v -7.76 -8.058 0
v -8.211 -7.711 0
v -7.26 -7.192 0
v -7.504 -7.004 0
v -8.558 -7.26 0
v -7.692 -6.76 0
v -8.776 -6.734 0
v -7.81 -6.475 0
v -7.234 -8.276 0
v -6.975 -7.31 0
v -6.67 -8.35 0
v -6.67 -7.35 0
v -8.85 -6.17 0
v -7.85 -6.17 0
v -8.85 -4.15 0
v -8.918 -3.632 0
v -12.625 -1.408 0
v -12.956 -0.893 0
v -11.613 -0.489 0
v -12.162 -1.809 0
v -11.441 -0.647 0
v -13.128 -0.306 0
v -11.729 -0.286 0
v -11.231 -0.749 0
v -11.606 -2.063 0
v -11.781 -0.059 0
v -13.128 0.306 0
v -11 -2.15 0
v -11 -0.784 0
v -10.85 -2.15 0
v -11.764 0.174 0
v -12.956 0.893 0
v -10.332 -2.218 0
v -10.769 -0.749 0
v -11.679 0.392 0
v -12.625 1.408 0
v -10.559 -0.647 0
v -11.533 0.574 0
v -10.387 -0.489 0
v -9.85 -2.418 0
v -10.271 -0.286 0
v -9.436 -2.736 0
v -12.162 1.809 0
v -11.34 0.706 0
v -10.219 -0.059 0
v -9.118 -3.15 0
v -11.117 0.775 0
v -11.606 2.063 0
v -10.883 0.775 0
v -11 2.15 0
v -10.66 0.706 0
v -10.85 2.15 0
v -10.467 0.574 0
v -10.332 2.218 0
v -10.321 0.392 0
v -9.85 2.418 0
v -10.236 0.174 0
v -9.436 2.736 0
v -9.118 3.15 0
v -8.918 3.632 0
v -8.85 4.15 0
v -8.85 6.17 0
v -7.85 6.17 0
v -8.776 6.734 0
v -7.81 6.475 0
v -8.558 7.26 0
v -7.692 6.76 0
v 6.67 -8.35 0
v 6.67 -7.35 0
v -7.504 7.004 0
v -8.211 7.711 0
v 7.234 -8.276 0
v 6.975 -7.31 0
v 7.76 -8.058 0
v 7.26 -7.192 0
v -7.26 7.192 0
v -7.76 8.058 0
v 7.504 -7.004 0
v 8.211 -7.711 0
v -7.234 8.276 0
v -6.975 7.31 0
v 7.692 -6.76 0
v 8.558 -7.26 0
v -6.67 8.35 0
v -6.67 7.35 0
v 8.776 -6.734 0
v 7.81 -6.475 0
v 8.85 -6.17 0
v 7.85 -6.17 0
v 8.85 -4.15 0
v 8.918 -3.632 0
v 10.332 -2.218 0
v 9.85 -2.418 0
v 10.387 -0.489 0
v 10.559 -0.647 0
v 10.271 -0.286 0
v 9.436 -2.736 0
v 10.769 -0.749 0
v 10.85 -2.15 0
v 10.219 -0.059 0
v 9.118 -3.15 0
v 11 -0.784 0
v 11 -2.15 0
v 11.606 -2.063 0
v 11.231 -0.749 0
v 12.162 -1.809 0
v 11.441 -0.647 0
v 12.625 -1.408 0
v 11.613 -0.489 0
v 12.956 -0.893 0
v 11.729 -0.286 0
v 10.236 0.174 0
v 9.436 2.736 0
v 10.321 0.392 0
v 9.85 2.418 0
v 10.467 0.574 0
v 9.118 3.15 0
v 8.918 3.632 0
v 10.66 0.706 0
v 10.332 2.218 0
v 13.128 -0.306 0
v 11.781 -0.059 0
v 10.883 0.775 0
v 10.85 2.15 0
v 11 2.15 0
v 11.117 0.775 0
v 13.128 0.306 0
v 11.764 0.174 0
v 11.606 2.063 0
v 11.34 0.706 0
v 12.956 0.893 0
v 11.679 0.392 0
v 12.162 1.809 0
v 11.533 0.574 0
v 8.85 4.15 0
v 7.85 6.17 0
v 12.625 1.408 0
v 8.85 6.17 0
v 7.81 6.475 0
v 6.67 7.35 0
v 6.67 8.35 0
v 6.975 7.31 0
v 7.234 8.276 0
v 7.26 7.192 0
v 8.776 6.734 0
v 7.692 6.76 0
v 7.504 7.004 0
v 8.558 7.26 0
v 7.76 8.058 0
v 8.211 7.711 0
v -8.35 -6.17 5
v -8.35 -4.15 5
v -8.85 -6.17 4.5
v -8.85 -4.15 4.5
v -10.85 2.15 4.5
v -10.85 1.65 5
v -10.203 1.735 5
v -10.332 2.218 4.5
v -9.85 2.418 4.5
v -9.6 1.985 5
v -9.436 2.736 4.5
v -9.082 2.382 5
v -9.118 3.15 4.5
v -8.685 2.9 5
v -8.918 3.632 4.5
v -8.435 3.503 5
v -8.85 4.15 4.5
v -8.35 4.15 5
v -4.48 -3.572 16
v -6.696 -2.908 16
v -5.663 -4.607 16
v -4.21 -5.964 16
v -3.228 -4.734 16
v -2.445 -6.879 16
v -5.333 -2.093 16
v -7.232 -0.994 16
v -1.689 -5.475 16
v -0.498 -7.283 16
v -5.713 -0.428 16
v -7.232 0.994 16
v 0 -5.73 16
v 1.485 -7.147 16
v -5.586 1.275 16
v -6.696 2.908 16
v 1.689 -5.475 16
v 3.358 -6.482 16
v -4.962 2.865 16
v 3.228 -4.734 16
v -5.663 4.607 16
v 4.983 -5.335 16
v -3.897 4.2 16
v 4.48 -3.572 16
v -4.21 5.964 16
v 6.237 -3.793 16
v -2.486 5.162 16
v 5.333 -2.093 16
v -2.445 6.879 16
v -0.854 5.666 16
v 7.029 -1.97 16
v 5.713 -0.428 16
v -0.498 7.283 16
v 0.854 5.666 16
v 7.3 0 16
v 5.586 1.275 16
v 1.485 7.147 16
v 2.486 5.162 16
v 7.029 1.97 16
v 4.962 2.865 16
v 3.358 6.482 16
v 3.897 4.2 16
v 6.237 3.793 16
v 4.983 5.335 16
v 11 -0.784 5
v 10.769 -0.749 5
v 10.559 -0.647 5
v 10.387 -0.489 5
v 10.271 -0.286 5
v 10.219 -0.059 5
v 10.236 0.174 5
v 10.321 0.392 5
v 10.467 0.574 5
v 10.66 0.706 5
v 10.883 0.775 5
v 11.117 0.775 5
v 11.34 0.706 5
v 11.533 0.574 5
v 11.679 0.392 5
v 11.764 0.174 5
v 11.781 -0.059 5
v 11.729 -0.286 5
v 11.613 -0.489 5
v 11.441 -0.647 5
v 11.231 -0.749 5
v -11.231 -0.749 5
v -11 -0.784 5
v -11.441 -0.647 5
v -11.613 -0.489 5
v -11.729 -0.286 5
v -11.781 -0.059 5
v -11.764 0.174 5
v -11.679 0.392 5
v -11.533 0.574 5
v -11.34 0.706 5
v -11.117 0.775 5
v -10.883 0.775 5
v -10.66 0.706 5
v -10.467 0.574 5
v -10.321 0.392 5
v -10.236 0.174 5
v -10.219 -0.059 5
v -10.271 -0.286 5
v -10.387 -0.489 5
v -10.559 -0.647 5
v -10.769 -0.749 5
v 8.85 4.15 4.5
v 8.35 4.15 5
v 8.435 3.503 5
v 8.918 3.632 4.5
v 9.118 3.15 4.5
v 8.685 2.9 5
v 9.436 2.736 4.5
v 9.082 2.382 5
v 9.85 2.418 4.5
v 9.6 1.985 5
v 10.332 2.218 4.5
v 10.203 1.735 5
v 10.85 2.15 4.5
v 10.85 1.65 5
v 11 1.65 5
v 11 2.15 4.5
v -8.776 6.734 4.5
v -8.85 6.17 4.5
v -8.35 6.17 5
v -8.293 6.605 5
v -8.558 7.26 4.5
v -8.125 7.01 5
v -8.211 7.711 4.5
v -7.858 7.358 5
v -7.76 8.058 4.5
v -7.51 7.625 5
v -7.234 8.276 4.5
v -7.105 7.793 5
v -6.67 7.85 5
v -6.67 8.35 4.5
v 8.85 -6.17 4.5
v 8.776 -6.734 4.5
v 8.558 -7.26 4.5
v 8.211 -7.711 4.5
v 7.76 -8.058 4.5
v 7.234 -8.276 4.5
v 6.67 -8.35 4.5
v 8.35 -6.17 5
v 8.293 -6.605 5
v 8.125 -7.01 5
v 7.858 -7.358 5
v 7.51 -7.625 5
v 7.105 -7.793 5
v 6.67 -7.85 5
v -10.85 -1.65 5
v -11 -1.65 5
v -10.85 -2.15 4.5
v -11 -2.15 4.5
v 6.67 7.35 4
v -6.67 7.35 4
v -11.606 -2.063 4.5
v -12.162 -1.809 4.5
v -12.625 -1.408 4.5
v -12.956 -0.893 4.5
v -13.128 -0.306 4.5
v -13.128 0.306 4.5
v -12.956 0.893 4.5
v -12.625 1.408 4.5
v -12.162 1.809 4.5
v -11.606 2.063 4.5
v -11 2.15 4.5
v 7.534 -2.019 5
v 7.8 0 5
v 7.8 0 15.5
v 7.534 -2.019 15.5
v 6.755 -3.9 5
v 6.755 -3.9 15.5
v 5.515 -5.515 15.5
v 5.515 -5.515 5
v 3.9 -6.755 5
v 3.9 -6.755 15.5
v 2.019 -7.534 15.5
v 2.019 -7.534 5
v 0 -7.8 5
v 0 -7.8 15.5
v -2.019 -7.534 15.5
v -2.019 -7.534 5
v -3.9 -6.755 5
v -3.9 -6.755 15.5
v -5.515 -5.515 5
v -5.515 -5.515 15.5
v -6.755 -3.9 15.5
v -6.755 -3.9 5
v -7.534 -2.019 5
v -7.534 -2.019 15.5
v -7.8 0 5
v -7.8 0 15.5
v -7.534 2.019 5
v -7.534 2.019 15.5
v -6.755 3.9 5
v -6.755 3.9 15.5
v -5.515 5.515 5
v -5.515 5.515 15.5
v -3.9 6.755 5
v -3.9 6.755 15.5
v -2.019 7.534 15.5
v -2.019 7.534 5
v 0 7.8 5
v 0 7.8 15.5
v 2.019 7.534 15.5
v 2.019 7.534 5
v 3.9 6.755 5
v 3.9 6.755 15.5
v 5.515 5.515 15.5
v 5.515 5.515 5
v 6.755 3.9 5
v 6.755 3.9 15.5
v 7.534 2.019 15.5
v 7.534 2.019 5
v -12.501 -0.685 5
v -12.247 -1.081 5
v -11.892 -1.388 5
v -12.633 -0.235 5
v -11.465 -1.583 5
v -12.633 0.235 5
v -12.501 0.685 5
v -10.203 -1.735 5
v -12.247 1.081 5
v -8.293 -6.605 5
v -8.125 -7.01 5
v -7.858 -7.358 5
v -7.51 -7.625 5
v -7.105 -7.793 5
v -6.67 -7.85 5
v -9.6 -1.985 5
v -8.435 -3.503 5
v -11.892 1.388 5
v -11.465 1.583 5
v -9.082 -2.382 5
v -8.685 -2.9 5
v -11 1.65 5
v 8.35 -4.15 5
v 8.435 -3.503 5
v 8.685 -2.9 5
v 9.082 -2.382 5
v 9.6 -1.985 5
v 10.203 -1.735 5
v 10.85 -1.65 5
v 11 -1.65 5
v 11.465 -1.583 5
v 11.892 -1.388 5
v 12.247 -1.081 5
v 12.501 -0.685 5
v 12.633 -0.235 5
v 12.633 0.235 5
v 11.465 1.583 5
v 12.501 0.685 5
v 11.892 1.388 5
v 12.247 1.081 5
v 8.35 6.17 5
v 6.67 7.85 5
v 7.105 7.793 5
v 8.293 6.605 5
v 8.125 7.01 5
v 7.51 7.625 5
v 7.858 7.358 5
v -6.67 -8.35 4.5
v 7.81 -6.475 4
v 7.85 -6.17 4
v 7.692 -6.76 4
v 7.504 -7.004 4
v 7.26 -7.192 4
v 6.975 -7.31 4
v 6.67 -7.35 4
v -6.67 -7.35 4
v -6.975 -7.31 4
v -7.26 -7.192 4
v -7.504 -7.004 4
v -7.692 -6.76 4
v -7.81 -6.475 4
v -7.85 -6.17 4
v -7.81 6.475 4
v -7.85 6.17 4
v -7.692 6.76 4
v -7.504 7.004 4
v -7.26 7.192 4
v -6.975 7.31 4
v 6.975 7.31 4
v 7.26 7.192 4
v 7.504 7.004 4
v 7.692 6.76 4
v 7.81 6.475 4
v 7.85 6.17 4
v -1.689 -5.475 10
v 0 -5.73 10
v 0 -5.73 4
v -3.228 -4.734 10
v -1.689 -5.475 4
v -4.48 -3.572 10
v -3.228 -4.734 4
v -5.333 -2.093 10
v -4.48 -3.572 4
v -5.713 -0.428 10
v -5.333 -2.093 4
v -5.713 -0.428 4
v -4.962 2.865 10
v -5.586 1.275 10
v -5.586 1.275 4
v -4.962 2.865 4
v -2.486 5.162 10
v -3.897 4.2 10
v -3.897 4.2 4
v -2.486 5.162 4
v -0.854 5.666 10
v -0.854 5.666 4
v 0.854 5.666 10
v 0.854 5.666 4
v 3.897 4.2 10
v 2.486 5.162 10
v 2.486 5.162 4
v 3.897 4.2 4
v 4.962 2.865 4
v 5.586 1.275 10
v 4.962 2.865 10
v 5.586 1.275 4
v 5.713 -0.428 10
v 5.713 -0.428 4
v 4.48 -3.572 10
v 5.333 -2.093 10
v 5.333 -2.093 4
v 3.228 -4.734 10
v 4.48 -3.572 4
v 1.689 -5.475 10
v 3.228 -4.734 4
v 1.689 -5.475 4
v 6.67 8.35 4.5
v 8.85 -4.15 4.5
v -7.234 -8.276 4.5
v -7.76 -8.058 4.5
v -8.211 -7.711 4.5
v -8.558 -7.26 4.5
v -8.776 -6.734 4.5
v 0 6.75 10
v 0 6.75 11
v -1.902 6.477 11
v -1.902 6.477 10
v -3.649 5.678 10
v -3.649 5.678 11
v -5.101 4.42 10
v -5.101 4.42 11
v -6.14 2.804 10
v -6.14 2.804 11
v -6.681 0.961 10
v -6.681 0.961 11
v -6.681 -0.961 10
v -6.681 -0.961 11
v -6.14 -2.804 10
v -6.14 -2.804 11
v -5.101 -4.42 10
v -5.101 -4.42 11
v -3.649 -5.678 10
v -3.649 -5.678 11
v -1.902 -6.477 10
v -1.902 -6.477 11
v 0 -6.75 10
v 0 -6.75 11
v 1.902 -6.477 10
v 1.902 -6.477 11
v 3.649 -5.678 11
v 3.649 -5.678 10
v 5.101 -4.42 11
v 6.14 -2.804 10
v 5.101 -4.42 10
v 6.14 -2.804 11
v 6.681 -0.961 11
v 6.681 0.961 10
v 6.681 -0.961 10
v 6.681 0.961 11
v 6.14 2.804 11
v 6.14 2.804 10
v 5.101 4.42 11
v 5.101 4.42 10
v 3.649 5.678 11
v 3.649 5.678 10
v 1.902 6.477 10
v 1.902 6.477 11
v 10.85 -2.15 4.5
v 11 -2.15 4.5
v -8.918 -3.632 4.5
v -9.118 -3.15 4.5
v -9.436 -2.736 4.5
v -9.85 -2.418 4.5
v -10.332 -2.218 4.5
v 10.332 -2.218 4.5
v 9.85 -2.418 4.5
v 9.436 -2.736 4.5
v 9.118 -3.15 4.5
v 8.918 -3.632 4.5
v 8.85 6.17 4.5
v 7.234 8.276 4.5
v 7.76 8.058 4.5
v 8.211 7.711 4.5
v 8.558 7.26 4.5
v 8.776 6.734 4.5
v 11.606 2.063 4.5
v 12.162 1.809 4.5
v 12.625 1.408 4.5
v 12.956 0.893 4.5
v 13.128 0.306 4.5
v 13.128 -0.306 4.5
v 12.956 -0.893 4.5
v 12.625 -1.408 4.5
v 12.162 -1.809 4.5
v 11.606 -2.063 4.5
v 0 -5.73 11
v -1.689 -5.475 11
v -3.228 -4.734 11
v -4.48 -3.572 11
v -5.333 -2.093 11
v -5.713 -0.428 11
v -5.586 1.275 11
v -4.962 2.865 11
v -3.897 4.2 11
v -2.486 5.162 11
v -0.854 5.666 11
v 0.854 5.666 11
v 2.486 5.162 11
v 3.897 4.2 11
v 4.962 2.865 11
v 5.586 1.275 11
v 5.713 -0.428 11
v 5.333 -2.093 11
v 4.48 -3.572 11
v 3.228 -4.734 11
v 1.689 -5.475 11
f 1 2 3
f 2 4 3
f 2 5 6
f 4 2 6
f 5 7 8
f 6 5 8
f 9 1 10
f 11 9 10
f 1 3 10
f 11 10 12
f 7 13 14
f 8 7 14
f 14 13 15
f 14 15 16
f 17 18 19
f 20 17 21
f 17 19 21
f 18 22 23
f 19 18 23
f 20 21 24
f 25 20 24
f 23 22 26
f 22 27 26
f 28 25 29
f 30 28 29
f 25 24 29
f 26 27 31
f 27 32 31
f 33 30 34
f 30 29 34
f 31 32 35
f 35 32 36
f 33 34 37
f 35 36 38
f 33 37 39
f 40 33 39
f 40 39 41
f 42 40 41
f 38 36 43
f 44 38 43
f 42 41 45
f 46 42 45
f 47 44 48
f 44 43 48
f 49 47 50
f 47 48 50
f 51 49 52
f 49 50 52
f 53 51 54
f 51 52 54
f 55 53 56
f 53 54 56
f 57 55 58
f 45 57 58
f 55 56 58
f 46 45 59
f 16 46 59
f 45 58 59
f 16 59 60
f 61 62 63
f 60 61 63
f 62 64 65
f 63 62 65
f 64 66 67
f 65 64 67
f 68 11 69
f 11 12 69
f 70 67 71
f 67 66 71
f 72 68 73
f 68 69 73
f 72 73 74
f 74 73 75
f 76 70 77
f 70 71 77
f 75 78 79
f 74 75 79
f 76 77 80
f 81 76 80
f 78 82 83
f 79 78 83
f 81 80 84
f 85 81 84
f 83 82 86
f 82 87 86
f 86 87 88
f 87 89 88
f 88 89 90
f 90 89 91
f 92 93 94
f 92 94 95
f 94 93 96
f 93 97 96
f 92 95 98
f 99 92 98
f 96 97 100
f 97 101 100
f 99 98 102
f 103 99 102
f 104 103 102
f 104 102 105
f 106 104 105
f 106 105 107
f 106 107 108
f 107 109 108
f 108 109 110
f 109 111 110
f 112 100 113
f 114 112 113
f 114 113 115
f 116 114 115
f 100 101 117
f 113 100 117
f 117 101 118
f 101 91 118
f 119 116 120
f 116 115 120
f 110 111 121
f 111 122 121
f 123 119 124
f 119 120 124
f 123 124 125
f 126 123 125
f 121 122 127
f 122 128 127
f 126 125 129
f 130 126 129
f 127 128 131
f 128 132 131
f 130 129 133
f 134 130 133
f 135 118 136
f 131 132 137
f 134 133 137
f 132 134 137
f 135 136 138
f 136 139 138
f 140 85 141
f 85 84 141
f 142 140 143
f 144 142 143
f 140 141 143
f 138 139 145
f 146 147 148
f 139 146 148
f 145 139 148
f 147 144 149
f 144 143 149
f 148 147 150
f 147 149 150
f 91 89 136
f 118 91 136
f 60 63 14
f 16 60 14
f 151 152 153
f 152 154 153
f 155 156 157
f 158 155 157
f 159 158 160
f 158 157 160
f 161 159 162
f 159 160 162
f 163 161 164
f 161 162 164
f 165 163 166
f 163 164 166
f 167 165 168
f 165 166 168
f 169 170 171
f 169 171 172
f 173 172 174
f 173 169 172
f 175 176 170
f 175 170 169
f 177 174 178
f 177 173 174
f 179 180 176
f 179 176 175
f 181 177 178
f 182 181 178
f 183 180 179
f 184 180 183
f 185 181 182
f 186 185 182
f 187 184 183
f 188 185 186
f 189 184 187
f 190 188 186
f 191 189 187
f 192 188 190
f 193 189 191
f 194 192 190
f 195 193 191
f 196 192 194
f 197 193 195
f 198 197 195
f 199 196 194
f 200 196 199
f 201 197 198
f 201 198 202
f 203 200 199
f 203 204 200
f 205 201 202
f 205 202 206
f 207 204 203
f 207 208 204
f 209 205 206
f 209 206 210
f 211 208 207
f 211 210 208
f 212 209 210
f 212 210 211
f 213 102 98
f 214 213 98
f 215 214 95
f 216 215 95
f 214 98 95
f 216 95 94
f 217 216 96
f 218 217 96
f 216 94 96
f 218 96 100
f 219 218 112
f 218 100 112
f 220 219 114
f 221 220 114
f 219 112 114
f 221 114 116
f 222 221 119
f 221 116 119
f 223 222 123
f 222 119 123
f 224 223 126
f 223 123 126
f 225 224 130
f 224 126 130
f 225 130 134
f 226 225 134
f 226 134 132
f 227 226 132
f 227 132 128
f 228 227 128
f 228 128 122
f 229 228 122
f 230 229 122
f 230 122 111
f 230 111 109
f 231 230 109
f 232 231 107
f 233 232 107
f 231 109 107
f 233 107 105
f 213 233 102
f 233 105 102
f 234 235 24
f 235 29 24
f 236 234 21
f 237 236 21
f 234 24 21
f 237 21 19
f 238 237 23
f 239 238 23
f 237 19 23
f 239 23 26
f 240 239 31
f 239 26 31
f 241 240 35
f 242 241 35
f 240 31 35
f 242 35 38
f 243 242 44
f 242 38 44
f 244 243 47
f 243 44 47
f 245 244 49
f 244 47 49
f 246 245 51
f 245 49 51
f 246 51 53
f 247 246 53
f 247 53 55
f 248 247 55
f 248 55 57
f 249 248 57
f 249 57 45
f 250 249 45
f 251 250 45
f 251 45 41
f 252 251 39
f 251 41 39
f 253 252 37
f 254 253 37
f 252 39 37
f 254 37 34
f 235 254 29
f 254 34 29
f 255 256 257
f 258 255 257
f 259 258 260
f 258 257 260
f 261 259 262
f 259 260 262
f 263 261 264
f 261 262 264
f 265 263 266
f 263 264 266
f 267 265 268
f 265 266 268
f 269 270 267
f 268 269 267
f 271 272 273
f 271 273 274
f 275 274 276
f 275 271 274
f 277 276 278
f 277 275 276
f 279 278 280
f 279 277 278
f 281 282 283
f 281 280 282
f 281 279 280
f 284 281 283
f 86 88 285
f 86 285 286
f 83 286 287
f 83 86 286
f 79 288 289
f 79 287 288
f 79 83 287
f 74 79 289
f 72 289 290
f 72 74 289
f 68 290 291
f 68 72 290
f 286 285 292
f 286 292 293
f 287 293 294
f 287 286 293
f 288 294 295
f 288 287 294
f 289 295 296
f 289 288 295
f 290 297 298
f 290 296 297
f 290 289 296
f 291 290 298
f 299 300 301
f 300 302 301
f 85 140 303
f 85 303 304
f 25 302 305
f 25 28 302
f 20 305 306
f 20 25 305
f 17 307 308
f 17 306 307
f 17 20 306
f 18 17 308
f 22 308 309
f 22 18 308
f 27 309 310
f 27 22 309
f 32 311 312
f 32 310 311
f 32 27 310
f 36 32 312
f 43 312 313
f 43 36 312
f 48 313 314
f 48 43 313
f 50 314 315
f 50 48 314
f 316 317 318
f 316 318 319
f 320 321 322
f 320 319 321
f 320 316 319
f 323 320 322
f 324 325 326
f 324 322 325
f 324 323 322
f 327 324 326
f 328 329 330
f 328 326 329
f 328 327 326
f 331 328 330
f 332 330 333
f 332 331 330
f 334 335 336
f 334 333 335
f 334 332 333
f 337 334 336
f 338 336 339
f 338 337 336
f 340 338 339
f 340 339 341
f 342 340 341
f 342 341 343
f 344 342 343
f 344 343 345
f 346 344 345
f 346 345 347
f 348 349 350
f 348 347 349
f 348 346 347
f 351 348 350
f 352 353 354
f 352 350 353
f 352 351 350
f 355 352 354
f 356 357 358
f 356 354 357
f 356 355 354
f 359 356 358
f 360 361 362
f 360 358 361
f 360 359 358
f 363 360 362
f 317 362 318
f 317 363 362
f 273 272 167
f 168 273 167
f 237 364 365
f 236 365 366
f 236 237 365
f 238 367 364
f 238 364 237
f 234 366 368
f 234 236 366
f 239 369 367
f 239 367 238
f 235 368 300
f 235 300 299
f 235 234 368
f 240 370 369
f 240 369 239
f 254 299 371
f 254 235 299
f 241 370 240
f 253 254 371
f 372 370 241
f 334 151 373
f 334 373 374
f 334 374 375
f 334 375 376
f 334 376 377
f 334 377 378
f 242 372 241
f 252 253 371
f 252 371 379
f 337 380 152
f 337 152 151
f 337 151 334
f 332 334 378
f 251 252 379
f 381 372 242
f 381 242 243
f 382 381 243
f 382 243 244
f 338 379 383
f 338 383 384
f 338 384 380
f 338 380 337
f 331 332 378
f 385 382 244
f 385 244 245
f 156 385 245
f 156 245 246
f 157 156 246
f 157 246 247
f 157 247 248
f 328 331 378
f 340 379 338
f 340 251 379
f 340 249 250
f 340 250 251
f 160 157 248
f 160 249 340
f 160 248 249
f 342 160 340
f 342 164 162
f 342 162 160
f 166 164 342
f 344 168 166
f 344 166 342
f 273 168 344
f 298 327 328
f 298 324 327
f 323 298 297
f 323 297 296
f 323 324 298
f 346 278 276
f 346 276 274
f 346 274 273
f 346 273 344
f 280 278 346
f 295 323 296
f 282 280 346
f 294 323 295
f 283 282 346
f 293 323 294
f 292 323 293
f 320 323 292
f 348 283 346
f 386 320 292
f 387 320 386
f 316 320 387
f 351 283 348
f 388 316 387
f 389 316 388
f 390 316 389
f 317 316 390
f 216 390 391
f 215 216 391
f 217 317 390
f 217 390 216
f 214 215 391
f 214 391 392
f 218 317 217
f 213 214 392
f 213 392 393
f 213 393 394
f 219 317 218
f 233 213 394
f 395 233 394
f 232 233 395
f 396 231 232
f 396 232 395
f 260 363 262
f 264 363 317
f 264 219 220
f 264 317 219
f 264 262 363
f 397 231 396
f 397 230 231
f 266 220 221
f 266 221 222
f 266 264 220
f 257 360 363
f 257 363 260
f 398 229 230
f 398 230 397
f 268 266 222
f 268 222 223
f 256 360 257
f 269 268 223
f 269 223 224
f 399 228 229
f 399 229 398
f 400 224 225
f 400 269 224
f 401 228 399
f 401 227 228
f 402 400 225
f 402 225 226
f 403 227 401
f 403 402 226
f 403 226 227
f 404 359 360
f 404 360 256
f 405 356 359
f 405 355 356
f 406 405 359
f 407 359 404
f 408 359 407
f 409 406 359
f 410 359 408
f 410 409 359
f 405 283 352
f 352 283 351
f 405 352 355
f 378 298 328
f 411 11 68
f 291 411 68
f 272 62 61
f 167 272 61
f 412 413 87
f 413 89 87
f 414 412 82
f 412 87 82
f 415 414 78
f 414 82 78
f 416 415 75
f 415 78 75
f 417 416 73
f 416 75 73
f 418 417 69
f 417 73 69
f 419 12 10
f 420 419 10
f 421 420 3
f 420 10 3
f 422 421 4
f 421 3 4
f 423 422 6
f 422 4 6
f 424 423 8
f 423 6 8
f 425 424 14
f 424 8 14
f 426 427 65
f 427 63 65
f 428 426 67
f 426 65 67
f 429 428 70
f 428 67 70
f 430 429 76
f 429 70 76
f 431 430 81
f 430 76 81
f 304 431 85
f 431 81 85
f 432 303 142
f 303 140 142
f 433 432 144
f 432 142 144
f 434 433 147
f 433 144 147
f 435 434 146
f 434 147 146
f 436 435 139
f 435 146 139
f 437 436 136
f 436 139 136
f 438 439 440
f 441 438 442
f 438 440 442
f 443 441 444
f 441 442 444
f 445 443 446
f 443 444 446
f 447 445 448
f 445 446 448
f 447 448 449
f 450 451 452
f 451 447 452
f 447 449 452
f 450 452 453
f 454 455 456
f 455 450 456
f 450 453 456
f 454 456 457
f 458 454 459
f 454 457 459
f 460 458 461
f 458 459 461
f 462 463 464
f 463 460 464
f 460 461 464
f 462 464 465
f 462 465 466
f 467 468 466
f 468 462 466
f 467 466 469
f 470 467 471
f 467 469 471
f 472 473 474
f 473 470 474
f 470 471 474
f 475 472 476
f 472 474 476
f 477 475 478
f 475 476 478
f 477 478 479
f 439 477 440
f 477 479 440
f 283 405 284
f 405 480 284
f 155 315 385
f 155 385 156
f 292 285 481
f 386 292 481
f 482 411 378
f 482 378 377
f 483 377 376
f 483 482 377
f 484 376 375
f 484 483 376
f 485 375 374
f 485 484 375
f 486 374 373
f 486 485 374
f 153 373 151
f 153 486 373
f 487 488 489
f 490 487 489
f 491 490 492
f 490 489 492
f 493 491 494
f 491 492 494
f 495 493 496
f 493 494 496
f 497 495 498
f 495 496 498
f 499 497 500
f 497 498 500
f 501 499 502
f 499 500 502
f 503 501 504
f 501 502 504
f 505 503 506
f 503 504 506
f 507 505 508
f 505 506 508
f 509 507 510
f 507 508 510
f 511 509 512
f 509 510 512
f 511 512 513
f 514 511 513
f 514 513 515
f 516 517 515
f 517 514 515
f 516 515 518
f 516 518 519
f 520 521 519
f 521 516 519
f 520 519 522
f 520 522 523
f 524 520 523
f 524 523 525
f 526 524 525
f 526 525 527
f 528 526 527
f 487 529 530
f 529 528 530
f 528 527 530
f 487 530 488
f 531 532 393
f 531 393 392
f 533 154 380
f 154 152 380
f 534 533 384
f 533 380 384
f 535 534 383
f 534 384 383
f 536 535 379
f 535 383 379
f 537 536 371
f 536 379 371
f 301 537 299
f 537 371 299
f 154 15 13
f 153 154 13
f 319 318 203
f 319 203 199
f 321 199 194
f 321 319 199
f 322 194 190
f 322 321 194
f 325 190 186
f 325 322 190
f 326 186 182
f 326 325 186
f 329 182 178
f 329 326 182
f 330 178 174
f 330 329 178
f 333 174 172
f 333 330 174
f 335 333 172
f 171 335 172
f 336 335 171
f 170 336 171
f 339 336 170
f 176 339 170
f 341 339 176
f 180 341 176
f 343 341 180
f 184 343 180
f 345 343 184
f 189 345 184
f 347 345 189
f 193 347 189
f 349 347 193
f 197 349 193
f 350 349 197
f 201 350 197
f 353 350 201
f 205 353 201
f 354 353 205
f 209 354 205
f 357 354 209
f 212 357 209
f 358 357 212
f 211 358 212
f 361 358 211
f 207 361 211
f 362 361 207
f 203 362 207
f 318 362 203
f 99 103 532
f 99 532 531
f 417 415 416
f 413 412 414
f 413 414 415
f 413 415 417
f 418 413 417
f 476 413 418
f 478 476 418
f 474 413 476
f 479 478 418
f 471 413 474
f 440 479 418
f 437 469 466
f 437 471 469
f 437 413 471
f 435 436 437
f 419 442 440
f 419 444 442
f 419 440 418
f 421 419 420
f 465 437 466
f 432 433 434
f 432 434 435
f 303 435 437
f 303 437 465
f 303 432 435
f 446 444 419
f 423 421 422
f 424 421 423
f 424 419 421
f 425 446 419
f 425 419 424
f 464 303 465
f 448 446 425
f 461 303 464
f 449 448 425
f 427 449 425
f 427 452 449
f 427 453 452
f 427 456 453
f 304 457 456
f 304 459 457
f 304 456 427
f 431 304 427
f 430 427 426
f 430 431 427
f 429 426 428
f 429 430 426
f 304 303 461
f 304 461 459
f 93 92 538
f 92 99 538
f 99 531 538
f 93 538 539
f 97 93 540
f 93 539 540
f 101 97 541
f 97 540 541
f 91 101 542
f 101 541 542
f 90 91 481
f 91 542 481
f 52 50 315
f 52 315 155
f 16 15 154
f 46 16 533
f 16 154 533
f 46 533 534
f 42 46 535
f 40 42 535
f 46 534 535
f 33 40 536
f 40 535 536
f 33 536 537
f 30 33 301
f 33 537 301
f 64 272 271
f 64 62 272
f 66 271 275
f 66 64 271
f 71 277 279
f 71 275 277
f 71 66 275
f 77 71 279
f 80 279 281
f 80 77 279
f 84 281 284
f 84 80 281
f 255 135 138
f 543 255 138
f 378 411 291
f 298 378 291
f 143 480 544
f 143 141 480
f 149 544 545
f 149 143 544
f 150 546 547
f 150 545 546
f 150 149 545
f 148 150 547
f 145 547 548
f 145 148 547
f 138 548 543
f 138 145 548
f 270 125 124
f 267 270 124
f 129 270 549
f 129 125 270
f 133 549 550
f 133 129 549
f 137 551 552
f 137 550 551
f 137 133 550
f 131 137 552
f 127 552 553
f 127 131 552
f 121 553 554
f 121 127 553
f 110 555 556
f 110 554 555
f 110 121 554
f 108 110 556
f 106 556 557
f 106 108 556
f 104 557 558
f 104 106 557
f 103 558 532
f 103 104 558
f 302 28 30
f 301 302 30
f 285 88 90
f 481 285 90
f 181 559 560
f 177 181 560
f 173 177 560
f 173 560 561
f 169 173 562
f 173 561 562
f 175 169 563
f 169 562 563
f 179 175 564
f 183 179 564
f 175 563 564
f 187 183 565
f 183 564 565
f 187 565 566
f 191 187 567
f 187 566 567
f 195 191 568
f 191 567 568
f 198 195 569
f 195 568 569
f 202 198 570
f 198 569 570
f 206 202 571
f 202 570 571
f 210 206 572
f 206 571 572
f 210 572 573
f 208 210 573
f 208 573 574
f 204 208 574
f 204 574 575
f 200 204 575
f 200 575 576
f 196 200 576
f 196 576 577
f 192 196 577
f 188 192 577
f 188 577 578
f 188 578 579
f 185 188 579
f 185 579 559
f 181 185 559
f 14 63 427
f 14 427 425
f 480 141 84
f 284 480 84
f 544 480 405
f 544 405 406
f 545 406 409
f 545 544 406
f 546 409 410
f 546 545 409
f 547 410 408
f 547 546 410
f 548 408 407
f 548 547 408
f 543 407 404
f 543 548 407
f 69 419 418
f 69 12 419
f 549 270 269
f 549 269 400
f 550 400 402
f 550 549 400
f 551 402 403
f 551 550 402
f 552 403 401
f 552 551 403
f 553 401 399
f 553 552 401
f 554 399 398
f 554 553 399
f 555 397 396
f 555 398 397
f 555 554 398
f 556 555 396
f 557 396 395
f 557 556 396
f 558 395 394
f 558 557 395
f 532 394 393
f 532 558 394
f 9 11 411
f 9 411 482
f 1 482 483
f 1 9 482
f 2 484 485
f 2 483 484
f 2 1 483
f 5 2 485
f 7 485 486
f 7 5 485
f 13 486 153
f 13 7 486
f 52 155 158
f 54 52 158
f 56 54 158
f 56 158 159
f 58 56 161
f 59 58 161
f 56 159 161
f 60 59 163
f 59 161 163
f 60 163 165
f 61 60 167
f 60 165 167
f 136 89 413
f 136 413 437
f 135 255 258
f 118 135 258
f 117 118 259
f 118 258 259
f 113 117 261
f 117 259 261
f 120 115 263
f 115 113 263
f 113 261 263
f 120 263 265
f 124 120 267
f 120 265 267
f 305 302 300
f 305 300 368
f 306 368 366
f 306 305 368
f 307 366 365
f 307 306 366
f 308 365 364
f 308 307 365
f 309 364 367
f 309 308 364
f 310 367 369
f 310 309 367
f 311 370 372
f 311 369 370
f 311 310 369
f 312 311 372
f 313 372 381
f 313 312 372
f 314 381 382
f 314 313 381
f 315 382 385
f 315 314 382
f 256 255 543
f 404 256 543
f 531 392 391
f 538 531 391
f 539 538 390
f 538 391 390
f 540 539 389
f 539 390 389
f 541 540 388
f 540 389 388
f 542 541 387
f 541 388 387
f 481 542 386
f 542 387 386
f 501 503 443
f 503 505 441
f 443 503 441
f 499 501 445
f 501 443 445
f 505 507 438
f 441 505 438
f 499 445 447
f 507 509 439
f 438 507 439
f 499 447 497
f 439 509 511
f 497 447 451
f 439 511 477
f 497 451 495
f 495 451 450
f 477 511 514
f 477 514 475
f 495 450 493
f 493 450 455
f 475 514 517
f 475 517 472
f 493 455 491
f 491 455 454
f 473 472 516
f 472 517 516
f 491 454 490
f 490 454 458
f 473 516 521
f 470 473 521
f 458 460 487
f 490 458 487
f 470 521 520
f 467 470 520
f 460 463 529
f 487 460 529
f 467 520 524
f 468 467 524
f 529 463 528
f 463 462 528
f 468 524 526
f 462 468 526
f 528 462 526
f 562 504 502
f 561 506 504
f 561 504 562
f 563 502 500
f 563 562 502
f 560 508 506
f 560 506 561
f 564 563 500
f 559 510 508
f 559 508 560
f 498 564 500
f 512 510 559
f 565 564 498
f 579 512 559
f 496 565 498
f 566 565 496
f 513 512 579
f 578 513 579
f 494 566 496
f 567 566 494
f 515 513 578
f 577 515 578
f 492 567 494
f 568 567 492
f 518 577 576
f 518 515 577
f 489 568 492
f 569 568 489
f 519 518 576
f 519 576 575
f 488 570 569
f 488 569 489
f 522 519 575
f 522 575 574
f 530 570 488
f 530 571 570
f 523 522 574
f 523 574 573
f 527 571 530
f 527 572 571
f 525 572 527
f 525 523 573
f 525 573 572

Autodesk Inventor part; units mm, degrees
ref_plane "YZ Plane" through (0, 0, 0) normal (1, 0, 0) x (0, 1, 0)
ref_plane "XZ Plane" through (0, 0, 0) normal (0, 1, 0) x (-1, 0, 0)
ref_plane "XY Plane" through (0, 0, 0) normal (0, 0, 1) x (1, 0, 0)
sketch "Boceto1" plane through (0, 0, 0) normal (0, 0, 1) x (1, 0, 0)
  line L0 (-6.67, 7.35) -> (6.67, 7.35) construction
  line L1 (7.85, 6.17) -> (7.85, -6.17) construction
  line L2 (6.67, -7.35) -> (-6.67, -7.35) construction
  line L3 (-7.85, -6.17) -> (-7.85, 6.17) construction
  line L4 (-7.85, 7.35) -> (7.85, -7.35) construction
  line L5 (7.85, 7.35) -> (-7.85, -7.35) construction
  arc A0 (-7.85, -6.17) -> (-6.67, -7.35) centre (-6.67, -6.17) ccw construction
  arc A1 (-6.67, 7.35) -> (-7.85, 6.17) centre (-6.67, 6.17) ccw construction
  arc A2 (7.85, 6.17) -> (6.67, 7.35) centre (6.67, 6.17) ccw construction
  arc A3 (6.67, -7.35) -> (7.85, -6.17) centre (6.67, -6.17) ccw construction
  line L6 (-6.67, -8.35) -> (6.67, -8.35)
  arc A4 (6.67, -8.35) -> (8.85, -6.17) centre (6.67, -6.17) ccw
  line L7 (8.85, -6.17) -> (8.85, 6.17)
  arc A5 (8.85, 6.17) -> (6.67, 8.35) centre (6.67, 6.17) ccw
  line L8 (6.67, 8.35) -> (-6.67, 8.35)
  arc A6 (-6.67, 8.35) -> (-8.85, 6.17) centre (-6.67, 6.17) ccw
  line L9 (-8.85, 6.17) -> (-8.85, -6.17)
  arc A7 (-8.85, -6.17) -> (-6.67, -8.35) centre (-6.67, -6.17) ccw
  circle A8 centre (-11, 0) radius 0.8
  circle A9 centre (11, 0) radius 0.8
  arc A10 (11, -2.15) -> (11, 2.15) centre (11, 0) ccw
  arc A11 (-11, 2.15) -> (-11, -2.15) centre (-11, 0) ccw
  line L10 (-11, 2.15) -> (-8.85, 2.15)
  line L11 (-11, -2.15) -> (-8.85, -2.15)
  line L12 (11, 2.15) -> (8.85, 2.15)
  line L13 (11, -2.15) -> (8.85, -2.15)
  point P0 (0, 0)
  point P1 (0, 0)
  point P2 (0, 0)
  dimension "d0" = 15.7
  dimension "d1" = 14.7
  dimension "d2" = 1.18
  dimension "d3" = 2.18
  dimension "d9" = 1.6
  dimension "d10" = 1.6
  dimension "d11" = 22
  dimension "d12" = 11
  dimension "d13" = 4.3
  dimension "d14" = 4.3
extrude "Extrusión1" add sketch "Boceto1" along normal blind 5 contours A7 L9 A6 L8 A5 L7 A4 L6 | L11 A11 L10 L9 | L7 L12 A10 L13 | A8 | A9
sketch "Boceto3" plane through (0, 0, 5) normal (0, 0, 1) x (1, 0, 0)
  circle A0 centre (0, 0) radius 7.8
  dimension "d15" = 15.6
extrude "Extrusión3" add sketch "Boceto3" along normal blind 11
sketch "Boceto4" plane through (0, 0, 0) normal (0, 0, -1) x (-1, 0, 0)
  line L0 (-6.67, 7.35) -> (6.67, 7.35)
  line L1 (7.85, 6.17) -> (7.85, -6.17)
  line L2 (6.67, -7.35) -> (-6.67, -7.35)
  line L3 (-7.85, -6.17) -> (-7.85, 6.17)
  line L4 (-7.85, 7.35) -> (7.85, -7.35) construction
  line L5 (7.85, 7.35) -> (-7.85, -7.35) construction
  arc A0 (-6.67, 7.35) -> (-7.85, 6.17) centre (-6.67, 6.17) ccw
  arc A1 (-7.85, -6.17) -> (-6.67, -7.35) centre (-6.67, -6.17) ccw
  arc A2 (6.67, -7.35) -> (7.85, -6.17) centre (6.67, -6.17) ccw
  arc A3 (7.85, 6.17) -> (6.67, 7.35) centre (6.67, 6.17) ccw
  point P0 (0, 0)
  dimension "d18" = 15.7
  dimension "d19" = 14.7
  dimension "d20" = 1.18
extrude "Extrusión4" cut sketch "Boceto4" against normal blind 4
sketch "Boceto5" plane through (0, 0, 16) normal (0, 0, 1) x (1, 0, 0)
  point P0 (0, 0)
hole "Agujero1" at (0, 0, 16) direction (0, 0, -1) diameter 11.459 end through all thread size "M12x0.5" class "6H" standard "ISO Metric profile"
sketch "Boceto6" plane through (0, 0, 5) normal (0, 0, 1) x (1, 0, 0)
  arc A0 (-11, 2.15) -> (-11, -2.15) centre (-11, 0) ccw construction
  arc A1 (11, -2.15) -> (11, 2.15) centre (11, 0) ccw construction
  point P0 (0, 0)
hole "Agujero2" at (-11, 0, 5) at (11, 0, 5) direction (0, 0, -1) diameter 1.567 end through all thread size "M2x0.4" class "6H" standard "ISO Metric profile"
chamfer "Chaflán1" distance 0.5 angle 45 1 edges at (-7.8, 0, 16)
fillet "Empalme1" radius 2 4 edges at (8.85, 2.15, 2.5) (8.85, -2.15, 2.5) (-8.85, 2.15, 2.5) (-8.85, -2.15, 2.5)
chamfer "Chaflán3" distance 0.5 angle 45 16 edges at (10.925, 2.15, 5) (13.15, 0, 5) (10.925, -2.15, 5) (8.85, -5.16, 5) (8.2115, -7.7115, 5) (0, -8.35, 5) (-8.2115, -7.7115, 5) (-8.85, -5.16, 5) (-10.925, -2.15, 5) (-13.15, 0, 5) (-10.925, 2.15, 5) (-8.85, 5.16, 5) (-8.2115, 7.7115, 5) (0, 8.35, 5) (8.2115, 7.7115, 5) (8.85, 5.16, 5)
sketch "Boceto9" plane through (0, 0, 0) normal (1, 0, 0) x (0, 1, 0)
  line L0 (-7.3, 16) -> (7.3, 16) construction
  line L1 (-7.8, 5) -> (7.8, 5) construction
  line L2 (-5.7295, 16) -> (5.7295, 16) construction
  line L3 (0, 16) -> (0, 5) construction
  arc A0 (6.25, 10) -> (6.25, 11) centre (6.25, 10.5) ccw
  line L4 (5.7295, 4) -> (5.7295, 16) construction
  line L5 (6.25, 11) -> (5.7295, 11)
  line L6 (6.25, 10) -> (5.7295, 10)
  line L7 (5.7295, 10) -> (5.7295, 11)
  line L8 (6.25, 10) -> (6.75, 10)
  line L9 (6.75, 10) -> (6.75, 11)
  line L10 (6.75, 11) -> (6.25, 11)
  point P0 (0, 0)
  dimension "d55" = 1
  dimension "d57" = 11.5
  dimension "d58" = 5.5
revolve "Revolución1" cut sketch "Boceto9" angle 360 about axis through (0, 0, 16) along (0, 0, -1)
properties part number "3d_DAA - M12 Lens Mount" material "Aluminium 6061-T6"
